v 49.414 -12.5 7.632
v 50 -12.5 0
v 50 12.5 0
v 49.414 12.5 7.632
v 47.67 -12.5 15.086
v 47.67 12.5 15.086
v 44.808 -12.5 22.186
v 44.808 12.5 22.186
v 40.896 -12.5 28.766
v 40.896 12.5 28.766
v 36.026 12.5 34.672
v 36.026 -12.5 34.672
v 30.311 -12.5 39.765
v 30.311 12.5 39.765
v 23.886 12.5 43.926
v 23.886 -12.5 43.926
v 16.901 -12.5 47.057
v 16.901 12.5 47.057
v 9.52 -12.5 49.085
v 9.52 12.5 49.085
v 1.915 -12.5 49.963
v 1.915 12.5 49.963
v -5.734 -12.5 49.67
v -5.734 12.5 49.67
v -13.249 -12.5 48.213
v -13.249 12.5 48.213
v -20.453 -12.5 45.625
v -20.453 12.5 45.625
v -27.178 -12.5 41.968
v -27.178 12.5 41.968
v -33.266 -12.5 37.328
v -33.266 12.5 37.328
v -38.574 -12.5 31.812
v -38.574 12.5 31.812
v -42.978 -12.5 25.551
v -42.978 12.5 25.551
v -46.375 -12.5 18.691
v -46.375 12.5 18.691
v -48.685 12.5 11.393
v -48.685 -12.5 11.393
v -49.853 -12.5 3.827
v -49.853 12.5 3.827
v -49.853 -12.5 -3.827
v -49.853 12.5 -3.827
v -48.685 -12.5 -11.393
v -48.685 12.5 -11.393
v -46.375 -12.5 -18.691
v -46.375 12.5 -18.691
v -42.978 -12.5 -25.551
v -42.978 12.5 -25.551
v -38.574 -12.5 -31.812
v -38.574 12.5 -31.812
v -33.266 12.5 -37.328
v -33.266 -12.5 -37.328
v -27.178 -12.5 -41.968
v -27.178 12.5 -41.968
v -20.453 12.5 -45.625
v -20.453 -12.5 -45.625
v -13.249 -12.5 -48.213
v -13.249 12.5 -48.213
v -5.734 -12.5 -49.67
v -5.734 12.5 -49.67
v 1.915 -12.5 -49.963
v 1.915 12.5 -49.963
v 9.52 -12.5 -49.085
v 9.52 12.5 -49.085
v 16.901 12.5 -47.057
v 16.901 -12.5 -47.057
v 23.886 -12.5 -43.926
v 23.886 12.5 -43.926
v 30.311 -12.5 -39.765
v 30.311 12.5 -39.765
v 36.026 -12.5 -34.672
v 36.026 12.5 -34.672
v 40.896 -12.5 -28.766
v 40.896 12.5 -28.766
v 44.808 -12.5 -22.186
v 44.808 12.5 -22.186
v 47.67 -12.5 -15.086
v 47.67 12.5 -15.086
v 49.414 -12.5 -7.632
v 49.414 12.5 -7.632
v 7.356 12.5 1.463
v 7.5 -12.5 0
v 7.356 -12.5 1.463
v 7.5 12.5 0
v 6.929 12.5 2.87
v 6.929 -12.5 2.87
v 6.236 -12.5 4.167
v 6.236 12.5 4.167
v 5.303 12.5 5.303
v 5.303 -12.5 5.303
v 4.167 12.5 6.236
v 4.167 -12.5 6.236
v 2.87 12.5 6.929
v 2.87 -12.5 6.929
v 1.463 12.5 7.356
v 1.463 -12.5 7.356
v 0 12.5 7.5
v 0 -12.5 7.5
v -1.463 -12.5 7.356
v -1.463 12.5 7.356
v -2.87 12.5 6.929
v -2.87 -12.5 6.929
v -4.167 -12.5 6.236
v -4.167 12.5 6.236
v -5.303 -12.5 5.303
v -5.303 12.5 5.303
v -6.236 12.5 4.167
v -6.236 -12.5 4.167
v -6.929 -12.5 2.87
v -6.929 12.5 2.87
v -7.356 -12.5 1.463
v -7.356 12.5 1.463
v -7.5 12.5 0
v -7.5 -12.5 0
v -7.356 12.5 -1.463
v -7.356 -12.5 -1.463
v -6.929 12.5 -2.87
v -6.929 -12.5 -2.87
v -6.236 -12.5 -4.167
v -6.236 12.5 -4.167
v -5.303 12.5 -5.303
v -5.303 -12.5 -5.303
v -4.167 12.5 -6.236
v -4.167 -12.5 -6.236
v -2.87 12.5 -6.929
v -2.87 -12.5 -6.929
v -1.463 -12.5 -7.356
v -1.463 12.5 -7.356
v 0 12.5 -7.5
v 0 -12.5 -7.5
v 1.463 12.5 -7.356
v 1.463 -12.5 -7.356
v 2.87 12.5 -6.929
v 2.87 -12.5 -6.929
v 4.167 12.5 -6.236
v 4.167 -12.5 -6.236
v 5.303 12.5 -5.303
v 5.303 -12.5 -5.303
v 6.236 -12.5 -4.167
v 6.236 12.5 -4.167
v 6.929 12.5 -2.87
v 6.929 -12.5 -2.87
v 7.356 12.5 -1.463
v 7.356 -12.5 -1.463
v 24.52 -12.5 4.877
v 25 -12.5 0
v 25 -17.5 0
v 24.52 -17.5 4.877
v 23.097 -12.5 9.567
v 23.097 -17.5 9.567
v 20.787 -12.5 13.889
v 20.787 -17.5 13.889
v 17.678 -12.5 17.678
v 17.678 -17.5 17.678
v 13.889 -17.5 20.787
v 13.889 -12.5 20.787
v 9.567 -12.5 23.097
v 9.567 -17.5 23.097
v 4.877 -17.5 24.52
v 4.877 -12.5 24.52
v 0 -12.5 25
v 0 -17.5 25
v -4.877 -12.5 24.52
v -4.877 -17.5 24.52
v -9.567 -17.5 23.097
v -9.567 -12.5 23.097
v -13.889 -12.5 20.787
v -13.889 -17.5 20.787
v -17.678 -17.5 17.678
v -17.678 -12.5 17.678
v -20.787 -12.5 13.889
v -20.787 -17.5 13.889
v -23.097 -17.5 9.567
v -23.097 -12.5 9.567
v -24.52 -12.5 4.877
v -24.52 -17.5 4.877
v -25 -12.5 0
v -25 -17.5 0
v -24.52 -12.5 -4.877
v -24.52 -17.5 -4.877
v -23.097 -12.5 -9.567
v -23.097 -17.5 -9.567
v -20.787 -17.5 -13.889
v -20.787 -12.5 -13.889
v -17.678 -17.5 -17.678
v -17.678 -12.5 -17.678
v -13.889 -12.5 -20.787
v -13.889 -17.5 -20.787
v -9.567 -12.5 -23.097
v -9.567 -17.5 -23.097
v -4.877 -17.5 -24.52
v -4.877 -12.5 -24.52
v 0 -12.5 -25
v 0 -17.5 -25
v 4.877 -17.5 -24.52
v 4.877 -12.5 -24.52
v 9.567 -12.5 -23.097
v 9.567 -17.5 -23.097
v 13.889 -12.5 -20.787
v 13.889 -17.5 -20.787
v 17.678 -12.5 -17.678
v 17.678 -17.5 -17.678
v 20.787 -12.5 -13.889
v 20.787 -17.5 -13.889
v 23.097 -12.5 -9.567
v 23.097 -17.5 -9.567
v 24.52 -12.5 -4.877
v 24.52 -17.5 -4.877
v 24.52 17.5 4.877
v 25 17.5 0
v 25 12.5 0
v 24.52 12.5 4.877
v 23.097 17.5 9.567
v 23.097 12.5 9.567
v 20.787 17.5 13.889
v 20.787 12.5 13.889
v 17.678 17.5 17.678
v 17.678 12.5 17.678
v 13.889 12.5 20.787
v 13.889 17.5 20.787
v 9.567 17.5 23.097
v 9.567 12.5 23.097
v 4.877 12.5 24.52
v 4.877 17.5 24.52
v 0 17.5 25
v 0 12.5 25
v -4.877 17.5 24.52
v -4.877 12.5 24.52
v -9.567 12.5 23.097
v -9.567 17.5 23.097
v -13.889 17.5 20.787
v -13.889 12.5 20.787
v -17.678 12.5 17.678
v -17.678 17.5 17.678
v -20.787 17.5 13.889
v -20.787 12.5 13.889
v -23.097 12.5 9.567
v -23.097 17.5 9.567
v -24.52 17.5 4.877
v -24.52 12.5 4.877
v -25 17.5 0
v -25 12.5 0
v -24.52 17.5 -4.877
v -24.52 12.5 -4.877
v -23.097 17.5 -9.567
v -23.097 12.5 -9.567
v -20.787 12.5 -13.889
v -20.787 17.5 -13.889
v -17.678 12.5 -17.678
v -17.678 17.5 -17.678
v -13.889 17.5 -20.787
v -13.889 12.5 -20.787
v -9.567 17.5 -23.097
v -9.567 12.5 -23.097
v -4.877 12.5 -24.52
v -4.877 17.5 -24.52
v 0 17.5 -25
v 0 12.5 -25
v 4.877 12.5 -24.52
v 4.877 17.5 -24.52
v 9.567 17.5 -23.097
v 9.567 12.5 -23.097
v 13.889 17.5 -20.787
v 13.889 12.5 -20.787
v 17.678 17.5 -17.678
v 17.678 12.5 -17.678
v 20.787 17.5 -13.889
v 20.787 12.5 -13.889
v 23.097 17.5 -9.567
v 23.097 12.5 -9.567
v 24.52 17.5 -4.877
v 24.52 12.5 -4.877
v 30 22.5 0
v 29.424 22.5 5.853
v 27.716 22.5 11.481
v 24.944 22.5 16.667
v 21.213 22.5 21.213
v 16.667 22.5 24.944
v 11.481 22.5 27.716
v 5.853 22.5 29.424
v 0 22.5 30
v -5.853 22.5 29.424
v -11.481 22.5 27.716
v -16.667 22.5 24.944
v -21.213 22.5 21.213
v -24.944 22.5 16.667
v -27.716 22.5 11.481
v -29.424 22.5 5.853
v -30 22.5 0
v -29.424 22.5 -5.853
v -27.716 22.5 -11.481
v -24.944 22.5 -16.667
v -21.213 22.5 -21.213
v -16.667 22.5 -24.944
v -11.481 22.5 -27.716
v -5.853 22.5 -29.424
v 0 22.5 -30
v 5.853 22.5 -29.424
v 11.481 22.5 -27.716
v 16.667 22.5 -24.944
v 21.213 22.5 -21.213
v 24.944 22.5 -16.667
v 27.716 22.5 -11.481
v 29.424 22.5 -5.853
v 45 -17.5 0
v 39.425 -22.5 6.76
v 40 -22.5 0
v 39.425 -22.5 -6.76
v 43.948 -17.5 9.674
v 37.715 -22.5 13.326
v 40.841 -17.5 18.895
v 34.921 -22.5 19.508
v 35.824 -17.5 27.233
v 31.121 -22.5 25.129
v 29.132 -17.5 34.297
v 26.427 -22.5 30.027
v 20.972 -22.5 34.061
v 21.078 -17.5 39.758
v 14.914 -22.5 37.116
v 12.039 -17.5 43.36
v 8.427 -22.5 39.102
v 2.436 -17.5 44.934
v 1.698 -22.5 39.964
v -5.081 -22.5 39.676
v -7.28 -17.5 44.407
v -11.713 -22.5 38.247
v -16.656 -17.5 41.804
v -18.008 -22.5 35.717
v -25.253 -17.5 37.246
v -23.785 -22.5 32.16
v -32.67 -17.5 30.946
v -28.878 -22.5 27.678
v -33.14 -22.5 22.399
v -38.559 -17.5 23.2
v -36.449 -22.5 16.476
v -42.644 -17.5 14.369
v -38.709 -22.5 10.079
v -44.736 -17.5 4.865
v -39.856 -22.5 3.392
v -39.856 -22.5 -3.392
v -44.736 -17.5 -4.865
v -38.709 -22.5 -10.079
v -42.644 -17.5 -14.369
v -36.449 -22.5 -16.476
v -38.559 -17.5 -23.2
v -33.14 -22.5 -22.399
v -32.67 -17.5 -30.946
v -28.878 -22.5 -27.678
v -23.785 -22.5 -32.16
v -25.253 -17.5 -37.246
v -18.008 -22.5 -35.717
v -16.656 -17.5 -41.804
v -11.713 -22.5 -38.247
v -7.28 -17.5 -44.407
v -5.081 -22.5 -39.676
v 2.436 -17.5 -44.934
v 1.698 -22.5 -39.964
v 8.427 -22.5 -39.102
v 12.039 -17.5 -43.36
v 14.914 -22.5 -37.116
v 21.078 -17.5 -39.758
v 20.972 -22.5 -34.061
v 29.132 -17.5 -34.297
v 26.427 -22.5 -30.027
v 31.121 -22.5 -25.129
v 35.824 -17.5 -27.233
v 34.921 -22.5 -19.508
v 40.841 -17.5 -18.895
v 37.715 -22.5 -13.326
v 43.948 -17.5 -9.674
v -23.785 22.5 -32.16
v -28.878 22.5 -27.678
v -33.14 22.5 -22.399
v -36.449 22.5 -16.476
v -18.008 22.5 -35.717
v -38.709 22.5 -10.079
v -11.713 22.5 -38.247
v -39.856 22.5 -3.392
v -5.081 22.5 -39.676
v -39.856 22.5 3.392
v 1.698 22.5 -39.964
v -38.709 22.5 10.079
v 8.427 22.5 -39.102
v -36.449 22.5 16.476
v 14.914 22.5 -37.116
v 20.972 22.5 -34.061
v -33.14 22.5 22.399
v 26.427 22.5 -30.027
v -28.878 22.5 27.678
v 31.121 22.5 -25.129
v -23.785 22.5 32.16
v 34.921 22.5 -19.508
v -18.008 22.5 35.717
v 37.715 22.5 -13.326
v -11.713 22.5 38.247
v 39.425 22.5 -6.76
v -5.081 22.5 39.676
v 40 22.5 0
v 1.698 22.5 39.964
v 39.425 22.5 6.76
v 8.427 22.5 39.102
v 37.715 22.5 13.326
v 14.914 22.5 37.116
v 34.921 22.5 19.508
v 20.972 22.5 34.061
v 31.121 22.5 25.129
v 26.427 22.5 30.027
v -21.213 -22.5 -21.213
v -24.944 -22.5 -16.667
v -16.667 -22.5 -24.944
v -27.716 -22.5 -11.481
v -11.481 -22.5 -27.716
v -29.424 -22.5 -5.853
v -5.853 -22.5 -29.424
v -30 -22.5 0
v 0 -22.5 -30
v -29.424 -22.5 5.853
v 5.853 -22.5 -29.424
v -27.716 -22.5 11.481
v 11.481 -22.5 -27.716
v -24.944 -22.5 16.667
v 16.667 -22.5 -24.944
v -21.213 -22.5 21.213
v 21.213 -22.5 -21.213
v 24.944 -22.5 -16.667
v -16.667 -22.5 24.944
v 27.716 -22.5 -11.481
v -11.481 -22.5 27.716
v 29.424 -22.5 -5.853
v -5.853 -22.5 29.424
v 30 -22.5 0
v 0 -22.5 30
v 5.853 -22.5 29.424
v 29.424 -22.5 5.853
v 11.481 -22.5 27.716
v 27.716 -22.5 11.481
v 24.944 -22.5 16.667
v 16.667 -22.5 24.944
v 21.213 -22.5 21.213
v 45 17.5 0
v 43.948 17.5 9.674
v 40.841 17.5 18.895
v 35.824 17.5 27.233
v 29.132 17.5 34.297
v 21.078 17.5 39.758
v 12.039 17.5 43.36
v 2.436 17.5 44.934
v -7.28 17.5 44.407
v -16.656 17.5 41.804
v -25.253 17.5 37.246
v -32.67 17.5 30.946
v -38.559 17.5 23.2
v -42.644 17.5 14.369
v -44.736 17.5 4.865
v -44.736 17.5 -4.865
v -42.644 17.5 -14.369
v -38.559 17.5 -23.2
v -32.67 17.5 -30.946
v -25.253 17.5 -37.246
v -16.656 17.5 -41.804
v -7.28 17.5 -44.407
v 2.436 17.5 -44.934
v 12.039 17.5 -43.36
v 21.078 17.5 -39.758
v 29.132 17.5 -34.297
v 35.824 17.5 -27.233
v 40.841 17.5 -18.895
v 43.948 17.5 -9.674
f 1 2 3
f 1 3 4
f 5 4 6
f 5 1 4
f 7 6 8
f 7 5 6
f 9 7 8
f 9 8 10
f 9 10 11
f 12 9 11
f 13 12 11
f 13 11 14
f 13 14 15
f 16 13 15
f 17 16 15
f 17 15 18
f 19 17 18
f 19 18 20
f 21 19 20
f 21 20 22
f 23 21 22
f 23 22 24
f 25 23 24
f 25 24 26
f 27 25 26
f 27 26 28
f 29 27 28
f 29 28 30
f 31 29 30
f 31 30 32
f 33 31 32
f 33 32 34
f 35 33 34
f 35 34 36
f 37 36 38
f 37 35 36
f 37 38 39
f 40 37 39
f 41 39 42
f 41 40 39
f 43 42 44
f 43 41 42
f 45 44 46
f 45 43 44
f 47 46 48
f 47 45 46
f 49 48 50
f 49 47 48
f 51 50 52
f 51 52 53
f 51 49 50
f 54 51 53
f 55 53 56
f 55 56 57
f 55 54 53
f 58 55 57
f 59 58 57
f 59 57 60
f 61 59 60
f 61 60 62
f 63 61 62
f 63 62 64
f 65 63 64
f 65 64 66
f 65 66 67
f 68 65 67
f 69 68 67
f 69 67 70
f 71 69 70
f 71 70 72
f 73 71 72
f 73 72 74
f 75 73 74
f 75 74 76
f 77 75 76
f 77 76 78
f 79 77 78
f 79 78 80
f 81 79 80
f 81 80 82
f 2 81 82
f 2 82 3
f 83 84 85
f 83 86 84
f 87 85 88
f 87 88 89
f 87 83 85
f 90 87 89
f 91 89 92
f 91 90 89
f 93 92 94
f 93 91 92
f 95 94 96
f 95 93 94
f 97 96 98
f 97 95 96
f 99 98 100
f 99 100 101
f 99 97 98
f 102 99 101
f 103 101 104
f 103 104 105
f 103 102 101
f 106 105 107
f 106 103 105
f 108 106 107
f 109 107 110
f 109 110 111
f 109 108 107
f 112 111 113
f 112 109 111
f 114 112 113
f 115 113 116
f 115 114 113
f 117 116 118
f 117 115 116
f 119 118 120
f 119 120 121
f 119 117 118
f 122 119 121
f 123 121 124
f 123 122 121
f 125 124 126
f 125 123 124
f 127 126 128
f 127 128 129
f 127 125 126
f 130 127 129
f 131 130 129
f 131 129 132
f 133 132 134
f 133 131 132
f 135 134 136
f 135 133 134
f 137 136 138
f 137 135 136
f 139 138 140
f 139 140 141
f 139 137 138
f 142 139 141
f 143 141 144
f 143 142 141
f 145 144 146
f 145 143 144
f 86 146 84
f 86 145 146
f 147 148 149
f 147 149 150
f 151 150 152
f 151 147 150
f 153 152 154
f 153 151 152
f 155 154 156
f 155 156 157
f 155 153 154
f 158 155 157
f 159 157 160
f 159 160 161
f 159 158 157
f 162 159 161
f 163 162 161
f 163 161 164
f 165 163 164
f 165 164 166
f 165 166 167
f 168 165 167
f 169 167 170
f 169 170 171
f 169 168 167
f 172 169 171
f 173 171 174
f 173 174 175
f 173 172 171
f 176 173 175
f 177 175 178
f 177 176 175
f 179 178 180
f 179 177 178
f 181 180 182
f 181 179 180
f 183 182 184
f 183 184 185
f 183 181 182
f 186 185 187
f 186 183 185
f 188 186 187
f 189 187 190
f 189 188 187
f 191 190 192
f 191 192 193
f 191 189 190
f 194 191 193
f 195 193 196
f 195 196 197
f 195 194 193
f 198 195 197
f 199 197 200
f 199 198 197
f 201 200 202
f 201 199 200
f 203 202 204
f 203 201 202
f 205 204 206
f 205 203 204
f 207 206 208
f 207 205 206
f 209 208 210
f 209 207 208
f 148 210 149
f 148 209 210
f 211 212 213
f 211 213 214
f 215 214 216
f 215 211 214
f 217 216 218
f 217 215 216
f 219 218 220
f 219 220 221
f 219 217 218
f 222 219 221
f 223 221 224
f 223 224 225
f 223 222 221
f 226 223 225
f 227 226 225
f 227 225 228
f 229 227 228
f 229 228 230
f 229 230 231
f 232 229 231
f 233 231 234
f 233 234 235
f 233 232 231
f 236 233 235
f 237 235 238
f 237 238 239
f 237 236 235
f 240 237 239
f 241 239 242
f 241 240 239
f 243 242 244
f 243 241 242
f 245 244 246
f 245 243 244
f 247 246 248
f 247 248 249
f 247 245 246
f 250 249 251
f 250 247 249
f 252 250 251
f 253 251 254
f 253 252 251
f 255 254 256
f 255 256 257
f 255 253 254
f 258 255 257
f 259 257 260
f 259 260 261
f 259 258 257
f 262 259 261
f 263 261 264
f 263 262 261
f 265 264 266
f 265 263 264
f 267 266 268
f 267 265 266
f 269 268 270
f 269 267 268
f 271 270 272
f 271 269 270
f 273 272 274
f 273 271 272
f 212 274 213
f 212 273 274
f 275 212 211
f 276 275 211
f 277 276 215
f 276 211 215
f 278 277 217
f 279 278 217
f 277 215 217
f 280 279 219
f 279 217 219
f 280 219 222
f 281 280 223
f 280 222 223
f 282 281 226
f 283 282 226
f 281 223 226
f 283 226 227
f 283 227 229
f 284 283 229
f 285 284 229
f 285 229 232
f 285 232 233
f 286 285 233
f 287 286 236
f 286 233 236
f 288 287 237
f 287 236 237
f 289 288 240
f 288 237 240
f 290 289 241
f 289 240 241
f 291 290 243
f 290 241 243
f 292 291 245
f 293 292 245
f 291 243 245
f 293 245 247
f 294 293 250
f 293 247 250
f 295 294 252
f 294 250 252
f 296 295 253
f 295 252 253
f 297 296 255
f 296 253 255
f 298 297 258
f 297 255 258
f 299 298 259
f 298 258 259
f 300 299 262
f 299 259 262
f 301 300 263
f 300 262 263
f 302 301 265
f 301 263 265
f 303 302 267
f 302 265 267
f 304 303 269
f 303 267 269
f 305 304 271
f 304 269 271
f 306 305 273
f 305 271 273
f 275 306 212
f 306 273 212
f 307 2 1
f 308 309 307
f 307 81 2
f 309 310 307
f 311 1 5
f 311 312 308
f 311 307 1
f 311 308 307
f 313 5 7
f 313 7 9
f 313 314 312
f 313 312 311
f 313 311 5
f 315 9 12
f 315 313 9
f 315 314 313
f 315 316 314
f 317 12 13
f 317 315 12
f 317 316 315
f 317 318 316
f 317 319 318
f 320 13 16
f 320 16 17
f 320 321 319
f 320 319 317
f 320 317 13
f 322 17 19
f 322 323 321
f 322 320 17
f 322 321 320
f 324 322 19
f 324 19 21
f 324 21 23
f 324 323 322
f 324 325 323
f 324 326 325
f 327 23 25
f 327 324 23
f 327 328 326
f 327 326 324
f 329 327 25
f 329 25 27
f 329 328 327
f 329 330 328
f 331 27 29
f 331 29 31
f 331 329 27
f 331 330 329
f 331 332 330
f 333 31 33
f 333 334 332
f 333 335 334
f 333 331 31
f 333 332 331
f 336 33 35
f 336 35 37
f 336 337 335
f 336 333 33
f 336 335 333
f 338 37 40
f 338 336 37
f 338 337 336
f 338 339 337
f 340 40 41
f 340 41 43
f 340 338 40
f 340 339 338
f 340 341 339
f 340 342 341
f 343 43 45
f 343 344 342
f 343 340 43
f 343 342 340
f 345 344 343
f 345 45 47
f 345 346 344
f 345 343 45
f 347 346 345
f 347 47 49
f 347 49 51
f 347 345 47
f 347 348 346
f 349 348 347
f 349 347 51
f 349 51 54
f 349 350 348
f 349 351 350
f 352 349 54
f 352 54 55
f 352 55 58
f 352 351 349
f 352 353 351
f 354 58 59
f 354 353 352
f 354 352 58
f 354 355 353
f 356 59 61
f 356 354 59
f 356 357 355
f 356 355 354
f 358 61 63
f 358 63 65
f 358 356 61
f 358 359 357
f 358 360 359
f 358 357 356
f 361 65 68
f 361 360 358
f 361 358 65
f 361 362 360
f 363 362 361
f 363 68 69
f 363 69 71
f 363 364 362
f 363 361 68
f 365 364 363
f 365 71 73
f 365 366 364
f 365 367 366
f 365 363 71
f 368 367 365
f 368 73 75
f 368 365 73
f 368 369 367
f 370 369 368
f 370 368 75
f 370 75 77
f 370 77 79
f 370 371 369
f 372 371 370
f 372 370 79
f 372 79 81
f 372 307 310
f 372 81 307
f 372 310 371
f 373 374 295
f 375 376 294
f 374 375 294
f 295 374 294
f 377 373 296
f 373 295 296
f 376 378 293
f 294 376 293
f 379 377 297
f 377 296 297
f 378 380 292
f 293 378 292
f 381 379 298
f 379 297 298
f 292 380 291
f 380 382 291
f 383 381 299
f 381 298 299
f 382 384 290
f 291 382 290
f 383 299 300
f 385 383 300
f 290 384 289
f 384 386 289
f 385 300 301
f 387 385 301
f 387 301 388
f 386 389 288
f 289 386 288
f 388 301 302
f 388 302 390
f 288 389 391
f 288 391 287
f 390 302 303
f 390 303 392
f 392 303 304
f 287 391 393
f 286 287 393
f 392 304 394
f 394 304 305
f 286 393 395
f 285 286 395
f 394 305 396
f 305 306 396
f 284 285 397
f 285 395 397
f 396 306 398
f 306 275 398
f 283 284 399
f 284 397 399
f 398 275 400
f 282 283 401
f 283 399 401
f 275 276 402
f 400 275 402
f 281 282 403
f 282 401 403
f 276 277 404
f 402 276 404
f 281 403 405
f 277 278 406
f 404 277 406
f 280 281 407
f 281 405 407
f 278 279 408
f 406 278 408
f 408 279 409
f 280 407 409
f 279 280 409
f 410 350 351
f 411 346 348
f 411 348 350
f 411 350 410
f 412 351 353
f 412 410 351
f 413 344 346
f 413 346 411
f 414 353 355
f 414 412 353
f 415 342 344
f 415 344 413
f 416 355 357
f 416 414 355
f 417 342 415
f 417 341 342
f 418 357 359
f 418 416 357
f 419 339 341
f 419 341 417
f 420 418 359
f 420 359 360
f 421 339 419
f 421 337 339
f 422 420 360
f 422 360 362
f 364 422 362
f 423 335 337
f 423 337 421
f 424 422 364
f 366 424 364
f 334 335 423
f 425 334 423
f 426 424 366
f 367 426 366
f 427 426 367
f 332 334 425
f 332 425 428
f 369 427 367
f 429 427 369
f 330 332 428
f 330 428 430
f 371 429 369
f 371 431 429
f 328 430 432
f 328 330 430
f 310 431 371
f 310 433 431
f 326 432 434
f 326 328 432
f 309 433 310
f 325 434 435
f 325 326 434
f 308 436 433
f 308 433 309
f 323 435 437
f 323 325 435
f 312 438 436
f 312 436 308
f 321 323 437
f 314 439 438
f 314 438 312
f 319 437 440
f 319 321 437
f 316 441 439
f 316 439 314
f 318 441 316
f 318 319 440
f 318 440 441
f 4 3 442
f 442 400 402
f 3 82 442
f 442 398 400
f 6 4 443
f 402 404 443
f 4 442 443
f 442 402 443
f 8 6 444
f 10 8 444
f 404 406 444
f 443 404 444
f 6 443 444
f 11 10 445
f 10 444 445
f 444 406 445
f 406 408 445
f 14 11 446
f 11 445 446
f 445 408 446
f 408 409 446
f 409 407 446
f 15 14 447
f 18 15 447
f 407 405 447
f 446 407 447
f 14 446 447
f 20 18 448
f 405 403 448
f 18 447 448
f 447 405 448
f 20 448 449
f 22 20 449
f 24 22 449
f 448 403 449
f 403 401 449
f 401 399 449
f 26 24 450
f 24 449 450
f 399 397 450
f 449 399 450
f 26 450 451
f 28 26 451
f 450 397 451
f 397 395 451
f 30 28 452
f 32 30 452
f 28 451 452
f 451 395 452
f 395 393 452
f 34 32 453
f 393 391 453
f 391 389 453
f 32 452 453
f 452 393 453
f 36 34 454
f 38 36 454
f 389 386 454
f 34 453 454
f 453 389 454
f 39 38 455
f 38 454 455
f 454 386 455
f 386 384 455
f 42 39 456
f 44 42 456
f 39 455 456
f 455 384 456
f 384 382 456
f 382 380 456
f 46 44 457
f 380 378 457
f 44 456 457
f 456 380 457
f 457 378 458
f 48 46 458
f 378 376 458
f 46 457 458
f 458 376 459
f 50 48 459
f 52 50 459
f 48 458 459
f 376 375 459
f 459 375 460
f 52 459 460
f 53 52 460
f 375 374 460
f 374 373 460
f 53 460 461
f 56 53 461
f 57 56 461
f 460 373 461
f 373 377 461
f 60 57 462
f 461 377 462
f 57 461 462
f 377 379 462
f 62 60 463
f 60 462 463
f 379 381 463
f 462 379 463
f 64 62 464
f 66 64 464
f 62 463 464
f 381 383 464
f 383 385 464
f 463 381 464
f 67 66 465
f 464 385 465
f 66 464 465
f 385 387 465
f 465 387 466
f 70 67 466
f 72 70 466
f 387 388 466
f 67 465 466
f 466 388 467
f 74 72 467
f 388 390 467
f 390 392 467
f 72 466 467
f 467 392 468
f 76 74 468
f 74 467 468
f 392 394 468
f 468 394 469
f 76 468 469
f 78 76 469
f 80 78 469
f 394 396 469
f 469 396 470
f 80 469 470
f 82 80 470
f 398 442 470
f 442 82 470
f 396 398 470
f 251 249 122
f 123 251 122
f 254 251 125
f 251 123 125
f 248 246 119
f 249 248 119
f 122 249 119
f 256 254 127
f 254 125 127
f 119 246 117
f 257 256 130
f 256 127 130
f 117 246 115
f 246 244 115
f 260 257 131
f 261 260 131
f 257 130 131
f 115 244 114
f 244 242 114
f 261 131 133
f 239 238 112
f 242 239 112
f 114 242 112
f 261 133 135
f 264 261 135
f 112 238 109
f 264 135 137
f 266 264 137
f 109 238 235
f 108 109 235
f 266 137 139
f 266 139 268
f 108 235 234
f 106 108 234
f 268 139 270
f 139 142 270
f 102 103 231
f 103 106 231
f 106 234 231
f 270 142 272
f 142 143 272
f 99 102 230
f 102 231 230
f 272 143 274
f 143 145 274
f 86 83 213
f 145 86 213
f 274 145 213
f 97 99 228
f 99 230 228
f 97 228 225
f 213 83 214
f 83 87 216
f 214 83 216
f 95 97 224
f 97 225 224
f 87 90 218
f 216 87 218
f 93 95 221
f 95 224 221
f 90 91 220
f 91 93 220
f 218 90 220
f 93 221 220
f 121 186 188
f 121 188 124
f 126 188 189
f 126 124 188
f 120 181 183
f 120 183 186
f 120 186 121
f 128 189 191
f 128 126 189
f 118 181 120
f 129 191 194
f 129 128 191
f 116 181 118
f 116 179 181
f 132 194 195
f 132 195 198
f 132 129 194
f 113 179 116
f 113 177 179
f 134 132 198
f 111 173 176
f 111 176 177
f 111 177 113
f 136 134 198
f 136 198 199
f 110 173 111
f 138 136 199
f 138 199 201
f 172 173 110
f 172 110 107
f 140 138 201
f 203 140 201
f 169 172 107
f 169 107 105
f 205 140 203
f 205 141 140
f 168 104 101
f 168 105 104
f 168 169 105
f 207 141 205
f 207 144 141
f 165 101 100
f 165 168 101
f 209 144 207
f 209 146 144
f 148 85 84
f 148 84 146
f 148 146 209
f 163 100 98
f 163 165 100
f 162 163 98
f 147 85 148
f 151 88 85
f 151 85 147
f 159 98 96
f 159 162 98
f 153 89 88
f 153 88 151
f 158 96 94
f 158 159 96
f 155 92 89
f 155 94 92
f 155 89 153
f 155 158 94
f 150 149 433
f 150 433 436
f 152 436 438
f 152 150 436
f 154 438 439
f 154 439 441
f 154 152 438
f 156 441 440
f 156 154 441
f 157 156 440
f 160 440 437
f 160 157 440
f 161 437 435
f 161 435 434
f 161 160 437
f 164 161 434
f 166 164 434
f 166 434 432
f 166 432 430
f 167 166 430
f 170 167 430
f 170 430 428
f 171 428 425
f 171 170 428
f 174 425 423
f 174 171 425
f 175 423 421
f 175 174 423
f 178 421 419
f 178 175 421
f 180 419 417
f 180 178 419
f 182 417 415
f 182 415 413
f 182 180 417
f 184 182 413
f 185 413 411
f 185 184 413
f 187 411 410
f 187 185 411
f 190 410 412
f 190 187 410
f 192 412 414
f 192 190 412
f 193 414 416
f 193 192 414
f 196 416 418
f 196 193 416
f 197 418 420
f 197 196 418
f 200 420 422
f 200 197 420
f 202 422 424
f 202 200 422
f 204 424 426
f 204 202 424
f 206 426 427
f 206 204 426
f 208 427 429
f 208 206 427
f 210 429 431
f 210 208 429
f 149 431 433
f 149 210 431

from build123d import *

# Parameters (mm, degrees)
F0_R     = 50
F0_R_2   = 25
F1_DEPTH = 22.5
F0_R_3   = 7.5
F2_DEPTH = 12.5
F3_SIZE  = 10
F4_SIZE  = 5


with BuildPart() as f1:
    # F0 (on Front) → F1 (new body, symmetric)
    with BuildSketch(Plane.XZ):
        Circle(F0_R)
        Circle(F0_R_2, mode=Mode.SUBTRACT)
    extrude(amount=F1_DEPTH, both=True)

    # F0 (on Front) → F2 (join, symmetric)
    with BuildSketch(Plane.XZ):
        Circle(F0_R_2)
        Circle(F0_R_3, mode=Mode.SUBTRACT)
    extrude(amount=F2_DEPTH, both=True)

    # F3
    f3_edges = [f1.edges().sort_by_distance(p)[0] for p in [
        (-50, -22.5, 0),
        (-50, 22.5, 0),
    ]]
    chamfer(f3_edges, length=F3_SIZE)

    # F4
    f4_edges = [f1.edges().sort_by_distance(p)[0] for p in [
        (-25, -22.5, 0),
        (-25, 22.5, 0),
    ]]
    chamfer(f4_edges, length=F4_SIZE)


solid = f1.part
